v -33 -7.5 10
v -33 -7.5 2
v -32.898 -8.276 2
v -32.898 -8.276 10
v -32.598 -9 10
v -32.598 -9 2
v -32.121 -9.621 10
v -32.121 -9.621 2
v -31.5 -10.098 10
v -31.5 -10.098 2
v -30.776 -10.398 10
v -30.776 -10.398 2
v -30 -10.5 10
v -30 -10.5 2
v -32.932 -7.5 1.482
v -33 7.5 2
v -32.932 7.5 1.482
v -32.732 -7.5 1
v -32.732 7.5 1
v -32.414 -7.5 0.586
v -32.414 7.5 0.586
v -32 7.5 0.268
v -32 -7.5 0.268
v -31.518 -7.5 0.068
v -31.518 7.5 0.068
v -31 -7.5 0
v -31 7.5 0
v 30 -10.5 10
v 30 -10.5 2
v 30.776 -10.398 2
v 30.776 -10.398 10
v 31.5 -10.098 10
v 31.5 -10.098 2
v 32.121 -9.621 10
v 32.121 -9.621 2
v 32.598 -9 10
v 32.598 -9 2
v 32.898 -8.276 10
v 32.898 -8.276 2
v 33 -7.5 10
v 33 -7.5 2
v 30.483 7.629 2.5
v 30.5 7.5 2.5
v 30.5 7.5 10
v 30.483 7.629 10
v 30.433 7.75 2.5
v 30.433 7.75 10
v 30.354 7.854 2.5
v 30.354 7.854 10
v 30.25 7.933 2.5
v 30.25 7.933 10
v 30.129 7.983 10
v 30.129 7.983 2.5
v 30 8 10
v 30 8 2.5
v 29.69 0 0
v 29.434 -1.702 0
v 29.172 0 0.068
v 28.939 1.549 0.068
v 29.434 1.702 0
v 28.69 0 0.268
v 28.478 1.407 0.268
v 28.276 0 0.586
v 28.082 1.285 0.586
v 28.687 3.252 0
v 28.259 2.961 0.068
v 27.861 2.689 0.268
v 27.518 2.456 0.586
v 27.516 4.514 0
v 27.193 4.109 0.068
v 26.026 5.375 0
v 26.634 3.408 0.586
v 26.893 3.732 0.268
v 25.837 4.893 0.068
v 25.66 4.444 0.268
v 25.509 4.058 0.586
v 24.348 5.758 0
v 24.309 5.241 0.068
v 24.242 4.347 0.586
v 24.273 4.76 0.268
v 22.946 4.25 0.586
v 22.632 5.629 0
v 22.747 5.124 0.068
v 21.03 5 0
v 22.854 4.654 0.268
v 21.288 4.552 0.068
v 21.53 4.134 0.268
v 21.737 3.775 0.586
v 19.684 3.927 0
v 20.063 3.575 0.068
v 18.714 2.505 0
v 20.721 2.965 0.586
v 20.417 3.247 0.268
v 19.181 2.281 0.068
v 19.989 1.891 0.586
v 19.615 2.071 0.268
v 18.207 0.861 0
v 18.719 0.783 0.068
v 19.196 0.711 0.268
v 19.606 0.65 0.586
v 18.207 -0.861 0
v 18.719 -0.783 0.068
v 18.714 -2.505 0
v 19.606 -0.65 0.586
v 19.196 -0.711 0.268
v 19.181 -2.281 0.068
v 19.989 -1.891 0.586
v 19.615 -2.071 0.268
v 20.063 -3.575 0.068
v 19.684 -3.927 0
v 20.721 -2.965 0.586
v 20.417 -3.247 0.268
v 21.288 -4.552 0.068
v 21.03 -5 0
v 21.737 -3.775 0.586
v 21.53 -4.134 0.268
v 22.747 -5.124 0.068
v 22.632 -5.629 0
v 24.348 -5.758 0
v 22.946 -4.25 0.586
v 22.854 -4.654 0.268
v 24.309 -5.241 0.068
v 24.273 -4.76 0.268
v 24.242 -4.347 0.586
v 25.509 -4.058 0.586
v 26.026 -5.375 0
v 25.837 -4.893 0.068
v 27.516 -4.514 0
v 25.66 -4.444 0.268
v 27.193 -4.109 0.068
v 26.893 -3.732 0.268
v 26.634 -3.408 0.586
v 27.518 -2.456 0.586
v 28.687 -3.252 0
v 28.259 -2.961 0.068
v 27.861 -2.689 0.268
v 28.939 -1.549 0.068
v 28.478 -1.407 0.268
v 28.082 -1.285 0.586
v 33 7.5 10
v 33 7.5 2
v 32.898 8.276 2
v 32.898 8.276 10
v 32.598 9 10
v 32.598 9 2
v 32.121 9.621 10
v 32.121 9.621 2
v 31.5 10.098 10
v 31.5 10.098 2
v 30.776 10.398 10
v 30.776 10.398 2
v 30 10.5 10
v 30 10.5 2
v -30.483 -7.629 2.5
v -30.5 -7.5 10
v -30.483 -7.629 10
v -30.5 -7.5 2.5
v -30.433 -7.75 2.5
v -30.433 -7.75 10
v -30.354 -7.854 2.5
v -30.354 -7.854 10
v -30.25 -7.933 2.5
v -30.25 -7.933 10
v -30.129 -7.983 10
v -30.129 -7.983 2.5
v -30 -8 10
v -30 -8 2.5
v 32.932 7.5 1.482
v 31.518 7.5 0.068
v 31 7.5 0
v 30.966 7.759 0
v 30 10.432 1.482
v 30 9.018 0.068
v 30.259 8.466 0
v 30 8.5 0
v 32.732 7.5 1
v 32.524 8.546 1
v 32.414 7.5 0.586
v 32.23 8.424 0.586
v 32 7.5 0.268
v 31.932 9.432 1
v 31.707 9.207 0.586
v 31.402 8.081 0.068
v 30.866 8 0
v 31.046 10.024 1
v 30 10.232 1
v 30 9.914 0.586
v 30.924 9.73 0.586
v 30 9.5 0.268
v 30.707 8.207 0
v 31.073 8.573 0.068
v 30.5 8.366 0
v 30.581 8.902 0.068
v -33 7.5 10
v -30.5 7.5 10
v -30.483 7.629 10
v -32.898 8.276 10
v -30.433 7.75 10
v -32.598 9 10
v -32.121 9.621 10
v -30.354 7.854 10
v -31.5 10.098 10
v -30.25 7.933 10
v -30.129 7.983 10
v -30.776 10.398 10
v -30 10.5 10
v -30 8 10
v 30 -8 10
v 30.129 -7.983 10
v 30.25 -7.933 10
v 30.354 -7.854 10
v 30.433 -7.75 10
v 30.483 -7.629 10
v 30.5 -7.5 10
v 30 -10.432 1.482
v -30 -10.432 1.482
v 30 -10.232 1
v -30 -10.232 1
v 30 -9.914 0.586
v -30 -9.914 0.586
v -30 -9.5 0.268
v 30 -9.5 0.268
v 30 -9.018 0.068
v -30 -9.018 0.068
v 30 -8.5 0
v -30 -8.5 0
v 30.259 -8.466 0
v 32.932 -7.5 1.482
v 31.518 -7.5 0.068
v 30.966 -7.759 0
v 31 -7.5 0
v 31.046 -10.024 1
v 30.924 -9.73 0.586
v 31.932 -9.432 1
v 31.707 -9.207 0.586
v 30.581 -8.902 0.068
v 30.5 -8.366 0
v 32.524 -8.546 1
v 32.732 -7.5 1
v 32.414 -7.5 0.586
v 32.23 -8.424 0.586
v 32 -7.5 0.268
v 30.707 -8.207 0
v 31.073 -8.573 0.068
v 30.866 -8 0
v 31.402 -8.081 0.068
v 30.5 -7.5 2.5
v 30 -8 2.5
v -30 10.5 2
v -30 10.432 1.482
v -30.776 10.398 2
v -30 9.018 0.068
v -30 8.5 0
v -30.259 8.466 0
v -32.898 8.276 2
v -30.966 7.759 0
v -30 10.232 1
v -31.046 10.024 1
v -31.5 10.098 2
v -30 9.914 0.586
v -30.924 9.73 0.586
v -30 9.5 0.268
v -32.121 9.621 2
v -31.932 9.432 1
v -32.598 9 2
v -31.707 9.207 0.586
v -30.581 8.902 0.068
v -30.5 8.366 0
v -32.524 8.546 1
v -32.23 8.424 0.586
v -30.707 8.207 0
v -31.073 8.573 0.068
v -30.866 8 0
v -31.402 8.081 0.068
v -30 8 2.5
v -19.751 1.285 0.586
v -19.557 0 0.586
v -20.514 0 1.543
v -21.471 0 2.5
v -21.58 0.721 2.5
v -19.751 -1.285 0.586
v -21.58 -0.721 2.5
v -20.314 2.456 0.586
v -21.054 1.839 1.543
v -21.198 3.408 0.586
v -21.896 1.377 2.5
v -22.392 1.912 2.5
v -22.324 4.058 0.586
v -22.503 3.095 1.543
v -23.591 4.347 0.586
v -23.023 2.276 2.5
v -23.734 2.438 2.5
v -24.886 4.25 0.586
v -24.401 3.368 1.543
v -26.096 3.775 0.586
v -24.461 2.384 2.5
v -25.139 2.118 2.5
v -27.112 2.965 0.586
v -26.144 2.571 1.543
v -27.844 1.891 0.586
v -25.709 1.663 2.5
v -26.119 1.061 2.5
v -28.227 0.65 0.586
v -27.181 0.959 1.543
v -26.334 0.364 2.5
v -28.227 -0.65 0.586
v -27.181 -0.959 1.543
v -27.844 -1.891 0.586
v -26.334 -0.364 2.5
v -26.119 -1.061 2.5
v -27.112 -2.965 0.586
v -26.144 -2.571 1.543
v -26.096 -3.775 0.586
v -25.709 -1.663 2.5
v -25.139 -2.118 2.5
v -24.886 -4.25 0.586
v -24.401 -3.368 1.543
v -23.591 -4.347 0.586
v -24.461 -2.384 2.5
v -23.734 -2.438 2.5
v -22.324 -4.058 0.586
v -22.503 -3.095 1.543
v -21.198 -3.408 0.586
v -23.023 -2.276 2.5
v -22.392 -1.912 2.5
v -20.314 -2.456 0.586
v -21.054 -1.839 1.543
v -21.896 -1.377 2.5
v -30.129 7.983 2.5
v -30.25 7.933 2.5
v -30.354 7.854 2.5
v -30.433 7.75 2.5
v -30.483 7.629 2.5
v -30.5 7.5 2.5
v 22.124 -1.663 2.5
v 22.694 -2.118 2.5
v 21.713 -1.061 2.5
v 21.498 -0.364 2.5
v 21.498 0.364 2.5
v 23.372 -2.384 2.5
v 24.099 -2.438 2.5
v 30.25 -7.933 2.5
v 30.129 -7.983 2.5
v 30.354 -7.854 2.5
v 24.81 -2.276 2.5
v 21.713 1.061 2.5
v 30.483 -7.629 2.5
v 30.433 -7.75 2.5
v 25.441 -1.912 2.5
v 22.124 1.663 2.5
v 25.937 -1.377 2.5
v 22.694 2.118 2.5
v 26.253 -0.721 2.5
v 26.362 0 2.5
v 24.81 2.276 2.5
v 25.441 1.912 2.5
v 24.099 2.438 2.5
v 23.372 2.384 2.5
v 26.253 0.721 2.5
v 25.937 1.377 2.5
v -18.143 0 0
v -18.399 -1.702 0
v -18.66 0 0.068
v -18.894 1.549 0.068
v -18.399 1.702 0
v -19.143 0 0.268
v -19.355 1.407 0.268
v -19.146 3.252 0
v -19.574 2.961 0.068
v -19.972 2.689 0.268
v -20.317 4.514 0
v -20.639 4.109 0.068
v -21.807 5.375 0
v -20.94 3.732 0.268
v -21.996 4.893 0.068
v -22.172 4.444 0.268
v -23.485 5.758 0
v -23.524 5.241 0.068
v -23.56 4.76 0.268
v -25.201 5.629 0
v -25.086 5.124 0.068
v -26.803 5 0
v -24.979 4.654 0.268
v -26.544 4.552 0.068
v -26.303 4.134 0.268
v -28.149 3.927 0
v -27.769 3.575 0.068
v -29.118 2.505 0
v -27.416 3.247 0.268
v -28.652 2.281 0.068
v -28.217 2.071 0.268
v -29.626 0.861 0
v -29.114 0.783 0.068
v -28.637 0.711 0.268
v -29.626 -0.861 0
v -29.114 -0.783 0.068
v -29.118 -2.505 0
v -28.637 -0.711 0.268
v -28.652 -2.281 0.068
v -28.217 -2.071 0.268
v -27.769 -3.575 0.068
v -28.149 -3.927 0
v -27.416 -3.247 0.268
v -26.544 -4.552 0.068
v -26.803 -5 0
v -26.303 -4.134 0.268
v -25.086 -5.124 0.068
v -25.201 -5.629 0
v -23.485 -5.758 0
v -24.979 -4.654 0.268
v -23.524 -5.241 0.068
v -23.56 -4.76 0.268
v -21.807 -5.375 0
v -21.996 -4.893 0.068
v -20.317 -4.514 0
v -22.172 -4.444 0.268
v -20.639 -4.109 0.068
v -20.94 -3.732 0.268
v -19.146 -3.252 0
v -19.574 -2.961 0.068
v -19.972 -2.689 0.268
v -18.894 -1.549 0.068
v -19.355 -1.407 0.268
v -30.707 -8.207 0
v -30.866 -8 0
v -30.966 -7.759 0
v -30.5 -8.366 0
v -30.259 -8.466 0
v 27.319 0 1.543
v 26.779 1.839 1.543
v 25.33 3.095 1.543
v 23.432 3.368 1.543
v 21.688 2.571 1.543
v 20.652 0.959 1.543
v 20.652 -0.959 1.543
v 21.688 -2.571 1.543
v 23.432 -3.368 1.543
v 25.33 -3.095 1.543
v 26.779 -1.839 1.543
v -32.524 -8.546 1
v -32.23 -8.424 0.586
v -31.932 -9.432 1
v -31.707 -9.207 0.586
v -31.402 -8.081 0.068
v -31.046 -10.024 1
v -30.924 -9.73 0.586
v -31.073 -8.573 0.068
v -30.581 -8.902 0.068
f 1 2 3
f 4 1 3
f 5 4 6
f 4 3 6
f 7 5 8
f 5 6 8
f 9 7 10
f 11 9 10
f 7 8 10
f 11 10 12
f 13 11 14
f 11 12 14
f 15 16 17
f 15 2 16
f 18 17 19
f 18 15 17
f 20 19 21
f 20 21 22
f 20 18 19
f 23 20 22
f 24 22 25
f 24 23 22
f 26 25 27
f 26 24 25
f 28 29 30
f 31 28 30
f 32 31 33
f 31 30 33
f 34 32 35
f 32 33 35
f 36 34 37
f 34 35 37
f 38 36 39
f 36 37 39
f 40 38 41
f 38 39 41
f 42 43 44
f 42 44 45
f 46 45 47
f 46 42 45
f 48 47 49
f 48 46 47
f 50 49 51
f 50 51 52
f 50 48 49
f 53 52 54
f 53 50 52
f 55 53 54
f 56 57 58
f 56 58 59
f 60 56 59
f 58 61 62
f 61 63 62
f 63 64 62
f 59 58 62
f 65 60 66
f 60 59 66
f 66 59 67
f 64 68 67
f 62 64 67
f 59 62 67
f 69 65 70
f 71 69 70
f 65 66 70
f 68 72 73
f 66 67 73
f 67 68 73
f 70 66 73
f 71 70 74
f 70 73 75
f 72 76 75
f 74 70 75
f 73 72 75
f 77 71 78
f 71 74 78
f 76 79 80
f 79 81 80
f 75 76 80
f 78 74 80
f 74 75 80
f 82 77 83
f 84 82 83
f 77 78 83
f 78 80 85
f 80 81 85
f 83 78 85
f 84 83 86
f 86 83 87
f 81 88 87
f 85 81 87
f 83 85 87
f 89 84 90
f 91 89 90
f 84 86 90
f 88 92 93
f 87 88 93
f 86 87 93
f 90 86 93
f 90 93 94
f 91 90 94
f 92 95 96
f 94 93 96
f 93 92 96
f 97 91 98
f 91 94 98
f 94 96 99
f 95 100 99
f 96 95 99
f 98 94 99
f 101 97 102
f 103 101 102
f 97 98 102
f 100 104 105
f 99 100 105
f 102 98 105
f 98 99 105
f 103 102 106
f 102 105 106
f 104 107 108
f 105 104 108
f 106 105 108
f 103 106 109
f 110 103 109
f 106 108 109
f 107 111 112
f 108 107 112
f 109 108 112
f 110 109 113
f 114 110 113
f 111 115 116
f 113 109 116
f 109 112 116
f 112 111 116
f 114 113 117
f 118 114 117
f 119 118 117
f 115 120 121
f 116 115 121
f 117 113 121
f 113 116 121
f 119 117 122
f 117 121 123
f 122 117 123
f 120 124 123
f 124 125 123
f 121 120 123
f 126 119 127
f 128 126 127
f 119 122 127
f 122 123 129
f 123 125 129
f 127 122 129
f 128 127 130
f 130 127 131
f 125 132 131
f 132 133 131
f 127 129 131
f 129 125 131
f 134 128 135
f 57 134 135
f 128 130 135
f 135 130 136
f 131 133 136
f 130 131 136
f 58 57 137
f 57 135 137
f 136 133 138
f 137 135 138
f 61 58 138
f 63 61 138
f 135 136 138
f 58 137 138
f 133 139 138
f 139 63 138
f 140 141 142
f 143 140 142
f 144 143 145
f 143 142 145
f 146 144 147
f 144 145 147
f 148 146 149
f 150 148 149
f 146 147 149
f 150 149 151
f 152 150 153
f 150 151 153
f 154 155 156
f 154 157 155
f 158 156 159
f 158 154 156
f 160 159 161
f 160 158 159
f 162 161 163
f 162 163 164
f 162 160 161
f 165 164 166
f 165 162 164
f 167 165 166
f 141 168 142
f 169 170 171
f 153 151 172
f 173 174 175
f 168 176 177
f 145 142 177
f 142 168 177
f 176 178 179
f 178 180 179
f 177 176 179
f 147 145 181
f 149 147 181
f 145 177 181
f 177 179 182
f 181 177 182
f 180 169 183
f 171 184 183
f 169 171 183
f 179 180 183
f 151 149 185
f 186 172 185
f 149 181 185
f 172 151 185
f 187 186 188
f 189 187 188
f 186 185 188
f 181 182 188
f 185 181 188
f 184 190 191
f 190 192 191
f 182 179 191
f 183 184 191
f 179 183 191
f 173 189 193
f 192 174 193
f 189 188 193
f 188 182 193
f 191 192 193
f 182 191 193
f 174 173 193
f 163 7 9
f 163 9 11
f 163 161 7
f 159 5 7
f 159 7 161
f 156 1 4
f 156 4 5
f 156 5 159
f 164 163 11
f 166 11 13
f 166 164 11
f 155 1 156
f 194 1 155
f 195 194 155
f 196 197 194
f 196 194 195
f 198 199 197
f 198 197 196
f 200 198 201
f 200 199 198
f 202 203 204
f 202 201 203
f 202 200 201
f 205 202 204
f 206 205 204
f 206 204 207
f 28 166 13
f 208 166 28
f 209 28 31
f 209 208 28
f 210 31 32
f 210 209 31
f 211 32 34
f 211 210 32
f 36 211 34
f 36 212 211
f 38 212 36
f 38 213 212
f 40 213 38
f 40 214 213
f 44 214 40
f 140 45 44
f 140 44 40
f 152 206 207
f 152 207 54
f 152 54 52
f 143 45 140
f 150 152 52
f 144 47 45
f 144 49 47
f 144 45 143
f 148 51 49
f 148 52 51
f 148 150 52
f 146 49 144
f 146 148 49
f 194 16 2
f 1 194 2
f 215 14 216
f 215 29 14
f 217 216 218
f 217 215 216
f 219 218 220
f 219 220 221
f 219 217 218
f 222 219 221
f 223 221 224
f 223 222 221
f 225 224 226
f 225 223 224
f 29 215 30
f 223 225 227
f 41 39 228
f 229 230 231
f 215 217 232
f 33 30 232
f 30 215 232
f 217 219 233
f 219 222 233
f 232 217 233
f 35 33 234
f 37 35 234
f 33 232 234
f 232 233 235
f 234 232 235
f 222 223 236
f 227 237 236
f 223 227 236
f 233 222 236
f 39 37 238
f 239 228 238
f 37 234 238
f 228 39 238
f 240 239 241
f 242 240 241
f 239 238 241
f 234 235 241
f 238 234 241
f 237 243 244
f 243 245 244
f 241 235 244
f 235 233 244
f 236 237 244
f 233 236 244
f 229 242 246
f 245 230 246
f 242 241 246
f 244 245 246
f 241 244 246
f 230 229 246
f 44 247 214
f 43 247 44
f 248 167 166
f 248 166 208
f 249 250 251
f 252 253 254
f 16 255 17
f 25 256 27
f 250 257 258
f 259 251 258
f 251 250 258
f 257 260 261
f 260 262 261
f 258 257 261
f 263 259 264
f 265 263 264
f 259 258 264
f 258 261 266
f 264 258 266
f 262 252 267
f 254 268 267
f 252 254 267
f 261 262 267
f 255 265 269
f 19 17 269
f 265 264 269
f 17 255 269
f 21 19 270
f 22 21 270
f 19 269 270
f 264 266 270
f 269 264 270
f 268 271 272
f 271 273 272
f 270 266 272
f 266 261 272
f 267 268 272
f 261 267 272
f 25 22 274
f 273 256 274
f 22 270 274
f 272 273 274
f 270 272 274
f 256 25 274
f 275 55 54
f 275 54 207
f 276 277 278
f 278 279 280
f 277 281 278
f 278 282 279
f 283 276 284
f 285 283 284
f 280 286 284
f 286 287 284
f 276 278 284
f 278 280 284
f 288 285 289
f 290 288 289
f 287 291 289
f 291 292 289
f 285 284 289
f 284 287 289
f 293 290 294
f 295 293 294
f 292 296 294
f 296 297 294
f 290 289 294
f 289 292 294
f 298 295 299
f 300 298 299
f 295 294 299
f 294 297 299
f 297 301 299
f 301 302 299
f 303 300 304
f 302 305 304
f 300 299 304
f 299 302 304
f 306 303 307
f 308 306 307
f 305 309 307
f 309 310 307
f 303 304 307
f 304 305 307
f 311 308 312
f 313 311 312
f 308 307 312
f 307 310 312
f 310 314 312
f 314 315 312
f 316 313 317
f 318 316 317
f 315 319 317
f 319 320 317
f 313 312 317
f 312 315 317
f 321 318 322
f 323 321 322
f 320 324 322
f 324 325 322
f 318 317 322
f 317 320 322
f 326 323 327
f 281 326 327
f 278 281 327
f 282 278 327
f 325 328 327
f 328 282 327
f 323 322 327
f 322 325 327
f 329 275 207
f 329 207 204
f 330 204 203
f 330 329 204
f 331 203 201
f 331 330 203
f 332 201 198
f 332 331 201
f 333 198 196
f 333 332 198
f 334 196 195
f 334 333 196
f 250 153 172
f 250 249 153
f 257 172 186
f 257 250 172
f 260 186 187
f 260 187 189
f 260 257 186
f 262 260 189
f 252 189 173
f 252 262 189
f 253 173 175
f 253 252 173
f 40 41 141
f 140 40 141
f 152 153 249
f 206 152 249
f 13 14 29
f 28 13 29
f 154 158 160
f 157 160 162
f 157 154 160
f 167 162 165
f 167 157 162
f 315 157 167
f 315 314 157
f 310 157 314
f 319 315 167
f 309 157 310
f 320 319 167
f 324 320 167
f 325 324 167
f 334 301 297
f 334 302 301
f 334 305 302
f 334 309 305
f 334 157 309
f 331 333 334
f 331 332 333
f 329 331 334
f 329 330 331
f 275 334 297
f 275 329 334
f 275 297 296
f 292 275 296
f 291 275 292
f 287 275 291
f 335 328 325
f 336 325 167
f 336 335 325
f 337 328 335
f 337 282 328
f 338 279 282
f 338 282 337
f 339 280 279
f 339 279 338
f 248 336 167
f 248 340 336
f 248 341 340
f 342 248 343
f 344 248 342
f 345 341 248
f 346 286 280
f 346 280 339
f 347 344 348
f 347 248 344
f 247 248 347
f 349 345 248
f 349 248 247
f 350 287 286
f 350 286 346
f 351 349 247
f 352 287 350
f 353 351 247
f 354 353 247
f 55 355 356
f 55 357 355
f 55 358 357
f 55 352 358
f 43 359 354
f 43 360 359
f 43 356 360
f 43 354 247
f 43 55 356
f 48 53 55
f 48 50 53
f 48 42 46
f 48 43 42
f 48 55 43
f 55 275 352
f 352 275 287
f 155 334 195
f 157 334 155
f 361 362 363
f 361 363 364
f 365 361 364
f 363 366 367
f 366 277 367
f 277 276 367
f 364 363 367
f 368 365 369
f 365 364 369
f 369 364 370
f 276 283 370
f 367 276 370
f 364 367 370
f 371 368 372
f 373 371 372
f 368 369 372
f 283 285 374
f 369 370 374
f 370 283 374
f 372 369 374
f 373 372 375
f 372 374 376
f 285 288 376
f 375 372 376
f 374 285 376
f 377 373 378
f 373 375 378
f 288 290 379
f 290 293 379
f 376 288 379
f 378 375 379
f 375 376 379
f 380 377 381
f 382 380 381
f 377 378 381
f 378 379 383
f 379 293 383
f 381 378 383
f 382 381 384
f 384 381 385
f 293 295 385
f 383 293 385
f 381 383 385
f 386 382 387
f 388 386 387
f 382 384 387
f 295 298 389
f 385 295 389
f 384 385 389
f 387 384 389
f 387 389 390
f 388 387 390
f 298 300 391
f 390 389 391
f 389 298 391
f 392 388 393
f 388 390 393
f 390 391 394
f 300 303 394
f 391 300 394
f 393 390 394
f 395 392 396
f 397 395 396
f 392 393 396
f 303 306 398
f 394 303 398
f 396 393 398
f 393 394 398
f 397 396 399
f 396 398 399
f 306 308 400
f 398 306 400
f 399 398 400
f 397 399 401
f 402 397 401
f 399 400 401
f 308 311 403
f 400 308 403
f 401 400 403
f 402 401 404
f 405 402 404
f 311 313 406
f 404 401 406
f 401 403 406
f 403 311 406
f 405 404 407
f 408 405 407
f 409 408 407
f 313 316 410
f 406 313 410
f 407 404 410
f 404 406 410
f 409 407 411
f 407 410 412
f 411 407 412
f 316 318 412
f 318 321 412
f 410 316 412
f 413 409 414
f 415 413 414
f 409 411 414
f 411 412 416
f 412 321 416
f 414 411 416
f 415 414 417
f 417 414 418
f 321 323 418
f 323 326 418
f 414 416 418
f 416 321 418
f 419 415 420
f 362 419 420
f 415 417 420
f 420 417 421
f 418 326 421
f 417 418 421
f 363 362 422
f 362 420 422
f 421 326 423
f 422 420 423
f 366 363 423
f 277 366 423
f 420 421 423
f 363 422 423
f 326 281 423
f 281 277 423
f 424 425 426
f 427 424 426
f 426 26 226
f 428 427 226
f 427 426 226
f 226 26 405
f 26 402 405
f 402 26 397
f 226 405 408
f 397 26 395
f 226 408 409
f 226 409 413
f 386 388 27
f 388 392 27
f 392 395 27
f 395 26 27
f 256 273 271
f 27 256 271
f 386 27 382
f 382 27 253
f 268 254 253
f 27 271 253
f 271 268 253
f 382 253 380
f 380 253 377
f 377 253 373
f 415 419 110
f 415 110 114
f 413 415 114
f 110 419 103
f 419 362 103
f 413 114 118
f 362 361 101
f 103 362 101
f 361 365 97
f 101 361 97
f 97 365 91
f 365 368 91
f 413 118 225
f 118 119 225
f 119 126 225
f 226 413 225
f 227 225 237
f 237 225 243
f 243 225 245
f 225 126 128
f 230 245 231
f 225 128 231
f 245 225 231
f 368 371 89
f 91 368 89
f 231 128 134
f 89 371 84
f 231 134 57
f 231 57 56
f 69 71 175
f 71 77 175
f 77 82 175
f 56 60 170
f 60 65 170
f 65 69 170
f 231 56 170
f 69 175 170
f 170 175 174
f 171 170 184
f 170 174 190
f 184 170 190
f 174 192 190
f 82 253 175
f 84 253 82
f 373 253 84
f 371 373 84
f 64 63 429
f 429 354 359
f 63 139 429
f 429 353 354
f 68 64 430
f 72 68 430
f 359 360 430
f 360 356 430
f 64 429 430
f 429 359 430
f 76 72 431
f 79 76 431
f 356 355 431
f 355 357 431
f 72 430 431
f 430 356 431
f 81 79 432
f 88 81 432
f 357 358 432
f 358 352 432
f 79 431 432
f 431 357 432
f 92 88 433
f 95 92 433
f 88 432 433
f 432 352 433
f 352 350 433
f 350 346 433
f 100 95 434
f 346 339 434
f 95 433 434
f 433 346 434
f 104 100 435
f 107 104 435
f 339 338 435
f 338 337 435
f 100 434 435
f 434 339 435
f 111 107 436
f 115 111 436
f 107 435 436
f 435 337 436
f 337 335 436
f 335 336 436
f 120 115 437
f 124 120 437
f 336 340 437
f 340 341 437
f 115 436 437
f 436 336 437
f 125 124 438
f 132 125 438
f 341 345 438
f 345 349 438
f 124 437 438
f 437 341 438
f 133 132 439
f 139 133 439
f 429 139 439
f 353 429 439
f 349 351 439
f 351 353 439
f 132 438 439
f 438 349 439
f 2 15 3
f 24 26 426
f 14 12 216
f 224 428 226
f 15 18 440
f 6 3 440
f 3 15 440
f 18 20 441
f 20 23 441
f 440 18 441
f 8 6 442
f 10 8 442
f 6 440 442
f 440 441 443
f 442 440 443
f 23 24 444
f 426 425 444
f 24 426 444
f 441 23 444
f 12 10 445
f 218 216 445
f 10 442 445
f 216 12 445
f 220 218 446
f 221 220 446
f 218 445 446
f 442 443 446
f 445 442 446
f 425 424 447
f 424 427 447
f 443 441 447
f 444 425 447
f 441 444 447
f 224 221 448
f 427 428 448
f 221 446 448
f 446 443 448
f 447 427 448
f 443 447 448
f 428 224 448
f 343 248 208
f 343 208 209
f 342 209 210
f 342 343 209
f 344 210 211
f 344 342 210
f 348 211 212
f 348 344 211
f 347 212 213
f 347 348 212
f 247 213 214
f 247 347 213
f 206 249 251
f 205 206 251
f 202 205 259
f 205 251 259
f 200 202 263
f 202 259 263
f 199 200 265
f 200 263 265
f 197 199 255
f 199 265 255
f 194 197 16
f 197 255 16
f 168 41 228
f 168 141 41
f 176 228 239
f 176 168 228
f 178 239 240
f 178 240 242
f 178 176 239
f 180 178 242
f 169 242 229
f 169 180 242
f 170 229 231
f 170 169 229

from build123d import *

# Parameters (mm, degrees)
F1_DEPTH = 10
F2_T     = -2.5
F3_R     = 1.9452355594
F4_DEPTH = 2.501
F6_R     = 2


# Not quite as in the source:
# - a fillet or chamfer that OpenCascade refuses, or shapes differently, is made with other operations: its cross-section is extruded or revolved along the edge and cut away or added


with BuildPart() as f1:
    # F0 (on Top) → F1 (new body)
    with BuildSketch(Plane.XY):
        with BuildLine():
            Line((-30, -10.5), (30, -10.5))
            ThreePointArc((30, -10.5), (32.1213203436, -9.6213203436), (33, -7.5))
            Line((33, -7.5), (33, 7.5))
            ThreePointArc((33, 7.5), (32.1213203436, 9.6213203436), (30, 10.5))
            Line((30, 10.5), (-30, 10.5))
            ThreePointArc((-30, 10.5), (-32.1213203436, 9.6213203436), (-33, 7.5))
            Line((-33, 7.5), (-33, -7.5))
            ThreePointArc((-33, -7.5), (-32.1213203436, -9.6213203436), (-30, -10.5))
        make_face()
    extrude(amount=F1_DEPTH)

    # F2
    f2_openings = [f1.faces().sort_by_distance(p)[0] for p in [
        (0, 0, 10),
    ]]
    offset(amount=F2_T, openings=f2_openings)

    # F3 (on face) → F4 (cut, through all)
    with BuildSketch(Plane.XY.offset(2.5)):
        with Locations((-23.9163879305, 0)):
            Circle(F3_R)
        with Locations((23.9163879305, 0)):
            Circle(F3_R)
    extrude(amount=-F4_DEPTH, mode=Mode.SUBTRACT)

    # F5: chamfer of 3 on 2 edges, made by hand

    # F5_s1 → F5_t2 (revolve, cut)
    with BuildSketch(Plane.XZ):
        Polygon((28.8616234899, 0), (25.8616234899, 3), (25.8616234899, 0), align=None)
    revolve(axis=Axis((23.9163879305, 0, 0), (0, 0, 1)), mode=Mode.SUBTRACT)

    # F5_s3 → F5_t4 (revolve, cut)
    with BuildSketch(Plane.XZ):
        Polygon((-18.9711523711, 0), (-21.9711523711, 3), (-21.9711523711, 0), align=None)
    revolve(axis=Axis((-23.9163879305, 0, 0), (0, 0, 1)), mode=Mode.SUBTRACT)

    # F6
    f6_edges = [f1.edges().sort_by_distance(p)[0] for p in [
        (0, -10.5, 0),
        (-32.12132, -9.62132, 0),
        (32.12132, -9.62132, 0),
        (-33, 0, 0),
        (33, 0, 0),
        (-32.12132, 9.62132, 0),
        (32.12132, 9.62132, 0),
        (0, 10.5, 0),
        (-28.861623, 0, 0),
        (18.971152, 0, 0),
    ]]
    fillet(f6_edges, radius=F6_R)


solid = f1.part
